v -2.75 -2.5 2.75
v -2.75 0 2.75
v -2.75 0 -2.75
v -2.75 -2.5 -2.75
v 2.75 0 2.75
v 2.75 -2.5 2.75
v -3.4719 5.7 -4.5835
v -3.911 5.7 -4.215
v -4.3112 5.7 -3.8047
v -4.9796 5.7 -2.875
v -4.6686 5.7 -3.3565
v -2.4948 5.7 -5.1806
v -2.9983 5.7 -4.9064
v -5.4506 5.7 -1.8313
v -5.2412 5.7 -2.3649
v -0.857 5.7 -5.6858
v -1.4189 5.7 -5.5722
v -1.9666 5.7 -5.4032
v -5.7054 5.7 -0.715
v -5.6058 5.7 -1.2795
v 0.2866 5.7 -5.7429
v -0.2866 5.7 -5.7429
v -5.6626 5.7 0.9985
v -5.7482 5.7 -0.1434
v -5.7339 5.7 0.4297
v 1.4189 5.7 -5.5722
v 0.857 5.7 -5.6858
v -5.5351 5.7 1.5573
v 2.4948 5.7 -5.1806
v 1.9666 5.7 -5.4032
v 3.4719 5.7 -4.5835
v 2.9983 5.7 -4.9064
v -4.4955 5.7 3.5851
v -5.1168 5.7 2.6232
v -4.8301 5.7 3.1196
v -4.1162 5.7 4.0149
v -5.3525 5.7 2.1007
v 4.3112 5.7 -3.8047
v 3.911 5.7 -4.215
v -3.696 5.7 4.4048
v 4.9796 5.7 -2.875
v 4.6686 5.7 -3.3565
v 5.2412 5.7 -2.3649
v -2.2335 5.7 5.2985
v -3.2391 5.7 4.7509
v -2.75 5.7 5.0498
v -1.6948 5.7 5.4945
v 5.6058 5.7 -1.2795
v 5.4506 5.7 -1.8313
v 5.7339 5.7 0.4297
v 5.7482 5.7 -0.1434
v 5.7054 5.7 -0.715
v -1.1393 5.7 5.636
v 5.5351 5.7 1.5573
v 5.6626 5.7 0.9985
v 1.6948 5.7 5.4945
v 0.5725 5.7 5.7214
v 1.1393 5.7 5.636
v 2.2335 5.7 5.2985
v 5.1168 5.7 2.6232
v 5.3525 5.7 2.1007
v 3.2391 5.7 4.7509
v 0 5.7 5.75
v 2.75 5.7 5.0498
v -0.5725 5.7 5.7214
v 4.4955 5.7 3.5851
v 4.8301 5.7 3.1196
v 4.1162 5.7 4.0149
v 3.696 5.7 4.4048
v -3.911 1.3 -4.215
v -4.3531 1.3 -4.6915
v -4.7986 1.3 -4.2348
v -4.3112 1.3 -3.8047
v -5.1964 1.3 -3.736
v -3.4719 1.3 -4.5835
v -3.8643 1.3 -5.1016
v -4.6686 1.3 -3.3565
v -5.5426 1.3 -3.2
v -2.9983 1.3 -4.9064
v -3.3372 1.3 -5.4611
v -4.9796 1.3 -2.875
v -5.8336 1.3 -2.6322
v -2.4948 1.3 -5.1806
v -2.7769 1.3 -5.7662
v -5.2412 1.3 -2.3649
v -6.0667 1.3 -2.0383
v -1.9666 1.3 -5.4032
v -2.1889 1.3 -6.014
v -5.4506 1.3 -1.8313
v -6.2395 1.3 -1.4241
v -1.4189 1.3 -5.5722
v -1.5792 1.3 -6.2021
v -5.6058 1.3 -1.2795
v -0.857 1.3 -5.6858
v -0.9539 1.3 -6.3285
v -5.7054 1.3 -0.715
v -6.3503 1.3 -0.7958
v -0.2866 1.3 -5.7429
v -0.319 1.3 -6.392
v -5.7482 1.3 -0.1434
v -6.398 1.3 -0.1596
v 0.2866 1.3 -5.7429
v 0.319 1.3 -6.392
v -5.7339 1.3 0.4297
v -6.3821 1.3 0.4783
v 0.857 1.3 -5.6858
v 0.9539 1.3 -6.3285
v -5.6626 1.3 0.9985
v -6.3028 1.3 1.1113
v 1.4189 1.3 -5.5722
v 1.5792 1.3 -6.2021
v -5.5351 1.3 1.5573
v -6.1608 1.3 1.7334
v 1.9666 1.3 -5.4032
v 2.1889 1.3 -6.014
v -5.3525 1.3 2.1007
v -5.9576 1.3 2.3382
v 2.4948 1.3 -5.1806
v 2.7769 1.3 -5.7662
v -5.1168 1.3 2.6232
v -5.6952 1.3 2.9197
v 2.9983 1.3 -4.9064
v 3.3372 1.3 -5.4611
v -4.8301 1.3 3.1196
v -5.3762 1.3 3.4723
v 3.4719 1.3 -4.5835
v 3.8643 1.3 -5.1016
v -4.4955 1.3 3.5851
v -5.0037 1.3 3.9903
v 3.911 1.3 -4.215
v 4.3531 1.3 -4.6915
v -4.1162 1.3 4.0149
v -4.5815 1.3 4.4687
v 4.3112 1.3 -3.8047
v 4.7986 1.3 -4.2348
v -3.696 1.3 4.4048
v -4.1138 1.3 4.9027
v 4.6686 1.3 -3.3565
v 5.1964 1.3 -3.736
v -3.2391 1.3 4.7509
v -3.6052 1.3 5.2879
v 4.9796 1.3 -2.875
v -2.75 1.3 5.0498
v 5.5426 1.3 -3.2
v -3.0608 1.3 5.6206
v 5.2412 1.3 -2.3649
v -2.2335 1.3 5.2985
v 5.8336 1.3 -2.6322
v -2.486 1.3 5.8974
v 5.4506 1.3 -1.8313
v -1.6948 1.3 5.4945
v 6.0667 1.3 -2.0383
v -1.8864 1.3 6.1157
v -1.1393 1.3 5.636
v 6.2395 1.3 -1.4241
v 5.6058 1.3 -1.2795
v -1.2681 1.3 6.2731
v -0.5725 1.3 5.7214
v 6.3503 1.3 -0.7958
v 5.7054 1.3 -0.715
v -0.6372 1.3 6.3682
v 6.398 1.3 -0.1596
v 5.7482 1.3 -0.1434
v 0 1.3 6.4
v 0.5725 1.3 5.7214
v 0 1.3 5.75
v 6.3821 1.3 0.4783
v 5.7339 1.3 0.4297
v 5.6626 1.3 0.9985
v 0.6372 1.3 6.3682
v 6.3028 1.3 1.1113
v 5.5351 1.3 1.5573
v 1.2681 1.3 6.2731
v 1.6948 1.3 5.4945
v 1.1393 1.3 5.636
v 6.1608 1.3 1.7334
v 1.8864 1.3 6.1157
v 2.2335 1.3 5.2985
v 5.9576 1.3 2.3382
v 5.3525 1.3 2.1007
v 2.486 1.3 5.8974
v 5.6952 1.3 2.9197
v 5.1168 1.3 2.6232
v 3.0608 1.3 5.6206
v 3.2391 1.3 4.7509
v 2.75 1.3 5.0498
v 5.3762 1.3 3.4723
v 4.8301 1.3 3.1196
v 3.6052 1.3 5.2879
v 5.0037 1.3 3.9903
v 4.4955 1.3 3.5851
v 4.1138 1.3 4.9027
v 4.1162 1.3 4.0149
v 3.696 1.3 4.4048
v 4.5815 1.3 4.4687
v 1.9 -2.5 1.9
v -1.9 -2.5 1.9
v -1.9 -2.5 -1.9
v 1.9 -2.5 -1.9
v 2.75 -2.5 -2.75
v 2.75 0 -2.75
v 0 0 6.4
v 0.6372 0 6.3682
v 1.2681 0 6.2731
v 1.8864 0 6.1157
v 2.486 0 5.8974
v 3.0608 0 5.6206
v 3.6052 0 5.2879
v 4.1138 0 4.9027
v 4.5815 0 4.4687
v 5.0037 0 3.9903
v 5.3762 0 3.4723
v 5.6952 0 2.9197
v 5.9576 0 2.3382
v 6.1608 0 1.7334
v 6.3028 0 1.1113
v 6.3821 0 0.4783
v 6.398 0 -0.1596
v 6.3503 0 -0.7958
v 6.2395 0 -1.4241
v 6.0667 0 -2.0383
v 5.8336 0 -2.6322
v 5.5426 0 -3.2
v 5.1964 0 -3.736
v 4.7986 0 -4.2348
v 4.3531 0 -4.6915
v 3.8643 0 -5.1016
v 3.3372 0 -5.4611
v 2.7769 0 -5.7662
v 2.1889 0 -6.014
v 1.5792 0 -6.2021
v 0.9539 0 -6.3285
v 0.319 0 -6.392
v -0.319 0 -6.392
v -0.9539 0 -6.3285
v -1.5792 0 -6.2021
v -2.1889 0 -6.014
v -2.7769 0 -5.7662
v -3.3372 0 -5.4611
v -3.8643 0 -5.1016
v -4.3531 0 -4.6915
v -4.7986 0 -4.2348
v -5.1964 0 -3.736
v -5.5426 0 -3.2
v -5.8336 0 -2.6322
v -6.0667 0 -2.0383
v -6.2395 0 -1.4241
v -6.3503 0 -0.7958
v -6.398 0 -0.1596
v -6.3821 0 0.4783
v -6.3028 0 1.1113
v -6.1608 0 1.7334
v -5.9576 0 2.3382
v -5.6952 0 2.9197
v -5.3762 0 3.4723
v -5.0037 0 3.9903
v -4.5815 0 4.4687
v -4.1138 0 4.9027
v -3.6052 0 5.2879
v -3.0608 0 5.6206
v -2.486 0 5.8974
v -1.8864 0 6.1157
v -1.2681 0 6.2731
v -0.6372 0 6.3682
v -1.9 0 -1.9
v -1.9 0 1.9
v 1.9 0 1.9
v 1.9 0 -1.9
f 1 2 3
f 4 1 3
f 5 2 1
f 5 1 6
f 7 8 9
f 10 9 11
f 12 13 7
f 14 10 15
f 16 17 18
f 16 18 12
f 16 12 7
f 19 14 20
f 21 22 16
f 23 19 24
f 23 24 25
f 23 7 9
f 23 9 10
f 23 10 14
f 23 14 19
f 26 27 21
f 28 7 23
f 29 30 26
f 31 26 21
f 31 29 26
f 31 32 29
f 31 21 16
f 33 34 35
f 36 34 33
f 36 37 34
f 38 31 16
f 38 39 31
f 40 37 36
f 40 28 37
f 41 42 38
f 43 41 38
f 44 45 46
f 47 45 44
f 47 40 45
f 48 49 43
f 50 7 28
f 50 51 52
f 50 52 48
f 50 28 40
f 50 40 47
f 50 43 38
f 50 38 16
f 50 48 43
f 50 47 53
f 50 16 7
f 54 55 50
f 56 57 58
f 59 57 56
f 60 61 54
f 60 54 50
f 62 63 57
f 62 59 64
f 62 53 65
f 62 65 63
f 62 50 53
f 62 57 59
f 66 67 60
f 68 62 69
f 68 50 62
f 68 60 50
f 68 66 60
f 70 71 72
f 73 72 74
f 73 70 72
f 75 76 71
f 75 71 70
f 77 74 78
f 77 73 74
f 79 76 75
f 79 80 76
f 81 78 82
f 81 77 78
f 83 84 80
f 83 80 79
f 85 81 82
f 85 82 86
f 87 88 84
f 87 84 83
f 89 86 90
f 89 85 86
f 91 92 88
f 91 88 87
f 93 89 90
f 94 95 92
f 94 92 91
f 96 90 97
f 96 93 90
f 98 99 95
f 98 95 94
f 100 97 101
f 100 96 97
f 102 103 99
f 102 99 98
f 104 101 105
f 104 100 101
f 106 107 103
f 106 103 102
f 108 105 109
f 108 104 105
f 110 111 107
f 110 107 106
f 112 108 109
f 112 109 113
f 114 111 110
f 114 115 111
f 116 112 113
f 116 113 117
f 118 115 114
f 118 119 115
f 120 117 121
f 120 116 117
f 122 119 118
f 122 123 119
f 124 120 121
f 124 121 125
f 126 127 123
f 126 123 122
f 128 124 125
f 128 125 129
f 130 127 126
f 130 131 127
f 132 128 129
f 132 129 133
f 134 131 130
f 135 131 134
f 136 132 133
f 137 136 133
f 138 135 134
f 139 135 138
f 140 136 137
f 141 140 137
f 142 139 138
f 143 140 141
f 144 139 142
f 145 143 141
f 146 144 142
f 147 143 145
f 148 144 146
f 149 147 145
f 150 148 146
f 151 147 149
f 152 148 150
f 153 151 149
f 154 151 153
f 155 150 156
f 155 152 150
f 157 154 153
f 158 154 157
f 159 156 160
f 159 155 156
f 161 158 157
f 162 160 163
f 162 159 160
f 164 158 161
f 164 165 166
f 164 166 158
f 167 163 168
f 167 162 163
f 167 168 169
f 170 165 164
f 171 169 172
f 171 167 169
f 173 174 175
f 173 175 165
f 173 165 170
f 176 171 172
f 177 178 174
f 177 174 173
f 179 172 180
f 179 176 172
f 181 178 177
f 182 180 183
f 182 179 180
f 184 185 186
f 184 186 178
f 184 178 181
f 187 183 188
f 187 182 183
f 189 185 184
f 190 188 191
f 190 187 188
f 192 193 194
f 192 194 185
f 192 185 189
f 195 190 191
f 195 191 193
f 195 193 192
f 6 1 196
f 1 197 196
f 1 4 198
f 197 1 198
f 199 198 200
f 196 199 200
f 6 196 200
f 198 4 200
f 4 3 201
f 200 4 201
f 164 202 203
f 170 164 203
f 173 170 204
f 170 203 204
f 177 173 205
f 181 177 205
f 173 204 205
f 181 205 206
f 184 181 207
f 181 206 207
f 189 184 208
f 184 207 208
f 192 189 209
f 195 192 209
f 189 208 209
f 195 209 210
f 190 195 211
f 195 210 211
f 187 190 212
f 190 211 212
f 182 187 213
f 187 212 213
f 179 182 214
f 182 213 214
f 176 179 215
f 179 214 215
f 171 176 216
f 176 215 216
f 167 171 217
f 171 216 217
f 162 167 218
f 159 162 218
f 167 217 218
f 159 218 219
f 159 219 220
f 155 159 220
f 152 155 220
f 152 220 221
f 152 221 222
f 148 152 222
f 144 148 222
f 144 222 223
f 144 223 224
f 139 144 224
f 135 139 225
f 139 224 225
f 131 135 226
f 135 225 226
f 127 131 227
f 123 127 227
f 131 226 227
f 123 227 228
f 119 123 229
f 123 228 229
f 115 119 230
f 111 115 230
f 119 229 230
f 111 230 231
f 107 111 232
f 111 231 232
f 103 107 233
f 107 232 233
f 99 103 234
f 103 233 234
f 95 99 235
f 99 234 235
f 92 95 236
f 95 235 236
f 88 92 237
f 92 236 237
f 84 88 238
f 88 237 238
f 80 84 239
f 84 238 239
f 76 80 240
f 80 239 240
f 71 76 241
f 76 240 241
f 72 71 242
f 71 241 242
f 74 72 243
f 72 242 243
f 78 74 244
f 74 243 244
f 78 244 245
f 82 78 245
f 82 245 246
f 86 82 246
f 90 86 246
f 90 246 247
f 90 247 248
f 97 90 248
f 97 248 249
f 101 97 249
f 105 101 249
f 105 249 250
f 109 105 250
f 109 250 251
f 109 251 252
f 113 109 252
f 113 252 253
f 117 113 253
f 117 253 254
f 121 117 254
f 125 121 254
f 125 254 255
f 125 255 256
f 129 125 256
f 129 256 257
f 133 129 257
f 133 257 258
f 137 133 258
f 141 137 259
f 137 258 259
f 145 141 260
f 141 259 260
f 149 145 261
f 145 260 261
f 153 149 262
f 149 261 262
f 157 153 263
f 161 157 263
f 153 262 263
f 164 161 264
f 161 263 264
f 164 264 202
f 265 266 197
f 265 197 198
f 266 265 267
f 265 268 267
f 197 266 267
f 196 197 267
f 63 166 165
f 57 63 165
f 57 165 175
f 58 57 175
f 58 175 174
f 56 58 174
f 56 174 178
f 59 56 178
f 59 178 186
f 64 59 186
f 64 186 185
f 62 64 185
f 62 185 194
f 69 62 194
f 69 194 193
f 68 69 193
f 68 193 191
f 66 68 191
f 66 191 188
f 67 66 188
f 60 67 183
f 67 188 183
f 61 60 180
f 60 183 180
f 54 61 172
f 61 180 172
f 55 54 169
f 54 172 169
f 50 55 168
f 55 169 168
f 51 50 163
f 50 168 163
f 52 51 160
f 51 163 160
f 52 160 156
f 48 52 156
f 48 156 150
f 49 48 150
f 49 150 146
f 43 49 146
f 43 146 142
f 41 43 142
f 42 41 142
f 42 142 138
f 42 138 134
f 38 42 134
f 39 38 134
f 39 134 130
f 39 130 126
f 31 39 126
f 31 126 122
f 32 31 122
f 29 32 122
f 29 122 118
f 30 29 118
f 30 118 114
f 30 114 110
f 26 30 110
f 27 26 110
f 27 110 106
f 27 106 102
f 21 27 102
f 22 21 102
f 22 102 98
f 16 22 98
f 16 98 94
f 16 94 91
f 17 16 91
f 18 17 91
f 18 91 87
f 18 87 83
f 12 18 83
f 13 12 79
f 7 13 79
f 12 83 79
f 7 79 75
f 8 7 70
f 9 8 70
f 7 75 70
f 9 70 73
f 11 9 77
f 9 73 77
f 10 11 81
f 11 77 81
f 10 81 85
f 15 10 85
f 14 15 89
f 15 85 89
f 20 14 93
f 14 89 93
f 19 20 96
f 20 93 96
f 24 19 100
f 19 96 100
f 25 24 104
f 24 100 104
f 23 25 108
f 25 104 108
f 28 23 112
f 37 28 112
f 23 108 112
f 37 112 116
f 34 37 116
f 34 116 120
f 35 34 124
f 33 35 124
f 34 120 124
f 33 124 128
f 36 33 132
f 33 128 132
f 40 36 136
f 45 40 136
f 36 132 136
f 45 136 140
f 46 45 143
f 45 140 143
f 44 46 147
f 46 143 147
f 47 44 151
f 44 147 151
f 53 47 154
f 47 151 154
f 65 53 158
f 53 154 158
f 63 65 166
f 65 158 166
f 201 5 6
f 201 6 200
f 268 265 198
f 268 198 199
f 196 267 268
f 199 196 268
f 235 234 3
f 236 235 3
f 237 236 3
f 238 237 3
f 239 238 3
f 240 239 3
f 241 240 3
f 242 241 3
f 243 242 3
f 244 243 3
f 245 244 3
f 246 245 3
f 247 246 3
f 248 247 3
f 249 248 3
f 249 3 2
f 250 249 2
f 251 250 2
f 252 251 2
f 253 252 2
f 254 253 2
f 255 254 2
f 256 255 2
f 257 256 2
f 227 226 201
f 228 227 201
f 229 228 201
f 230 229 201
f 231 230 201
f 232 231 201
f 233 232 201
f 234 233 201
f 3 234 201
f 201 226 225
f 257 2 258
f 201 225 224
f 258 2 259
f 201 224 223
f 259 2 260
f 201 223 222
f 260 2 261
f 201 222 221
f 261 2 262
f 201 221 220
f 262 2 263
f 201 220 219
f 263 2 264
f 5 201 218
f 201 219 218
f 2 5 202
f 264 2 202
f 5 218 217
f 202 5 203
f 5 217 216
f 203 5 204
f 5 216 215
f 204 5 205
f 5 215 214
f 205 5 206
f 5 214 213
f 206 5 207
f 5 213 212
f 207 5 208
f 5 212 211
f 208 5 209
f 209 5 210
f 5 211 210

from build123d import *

# Parameters (mm, degrees)
SKETCH1_R           = 6.4
BOSS_EXTRUDE1_DEPTH = 1.3
SKETCH1_3_R         = 5.75
BOSS_EXTRUDE2_DEPTH = 5.7
SKETCH2_W           = 5.5
SKETCH2_H           = 5.5
SKETCH2_W_2         = 3.8
SKETCH2_H_2         = 3.8
BOSS_EXTRUDE3_DEPTH = 2.5


with BuildPart() as part:
    # Sketch1 → Boss-Extrude1 (new body)
    with BuildSketch(Plane(origin=(0, 0, 0), x_dir=(1, 0, 0), z_dir=(0, 1, 0))):
        Circle(SKETCH1_R)
    extrude(amount=BOSS_EXTRUDE1_DEPTH)

    # Sketch1<3> → Boss-Extrude2 (add)
    with BuildSketch(Plane(origin=(0, 0, 0), x_dir=(1, 0, 0), z_dir=(0, 1, 0))):
        Circle(SKETCH1_3_R)
    extrude(amount=BOSS_EXTRUDE2_DEPTH)

    # Sketch2 → Boss-Extrude3 (add)
    with BuildSketch(Plane(origin=(0, 0, 0), x_dir=(1, 0, 0), z_dir=(0, 1, 0))):
        Rectangle(SKETCH2_W, SKETCH2_H)
        Rectangle(SKETCH2_W_2, SKETCH2_H_2, mode=Mode.SUBTRACT)
    extrude(amount=-BOSS_EXTRUDE3_DEPTH)


solid = part.part
